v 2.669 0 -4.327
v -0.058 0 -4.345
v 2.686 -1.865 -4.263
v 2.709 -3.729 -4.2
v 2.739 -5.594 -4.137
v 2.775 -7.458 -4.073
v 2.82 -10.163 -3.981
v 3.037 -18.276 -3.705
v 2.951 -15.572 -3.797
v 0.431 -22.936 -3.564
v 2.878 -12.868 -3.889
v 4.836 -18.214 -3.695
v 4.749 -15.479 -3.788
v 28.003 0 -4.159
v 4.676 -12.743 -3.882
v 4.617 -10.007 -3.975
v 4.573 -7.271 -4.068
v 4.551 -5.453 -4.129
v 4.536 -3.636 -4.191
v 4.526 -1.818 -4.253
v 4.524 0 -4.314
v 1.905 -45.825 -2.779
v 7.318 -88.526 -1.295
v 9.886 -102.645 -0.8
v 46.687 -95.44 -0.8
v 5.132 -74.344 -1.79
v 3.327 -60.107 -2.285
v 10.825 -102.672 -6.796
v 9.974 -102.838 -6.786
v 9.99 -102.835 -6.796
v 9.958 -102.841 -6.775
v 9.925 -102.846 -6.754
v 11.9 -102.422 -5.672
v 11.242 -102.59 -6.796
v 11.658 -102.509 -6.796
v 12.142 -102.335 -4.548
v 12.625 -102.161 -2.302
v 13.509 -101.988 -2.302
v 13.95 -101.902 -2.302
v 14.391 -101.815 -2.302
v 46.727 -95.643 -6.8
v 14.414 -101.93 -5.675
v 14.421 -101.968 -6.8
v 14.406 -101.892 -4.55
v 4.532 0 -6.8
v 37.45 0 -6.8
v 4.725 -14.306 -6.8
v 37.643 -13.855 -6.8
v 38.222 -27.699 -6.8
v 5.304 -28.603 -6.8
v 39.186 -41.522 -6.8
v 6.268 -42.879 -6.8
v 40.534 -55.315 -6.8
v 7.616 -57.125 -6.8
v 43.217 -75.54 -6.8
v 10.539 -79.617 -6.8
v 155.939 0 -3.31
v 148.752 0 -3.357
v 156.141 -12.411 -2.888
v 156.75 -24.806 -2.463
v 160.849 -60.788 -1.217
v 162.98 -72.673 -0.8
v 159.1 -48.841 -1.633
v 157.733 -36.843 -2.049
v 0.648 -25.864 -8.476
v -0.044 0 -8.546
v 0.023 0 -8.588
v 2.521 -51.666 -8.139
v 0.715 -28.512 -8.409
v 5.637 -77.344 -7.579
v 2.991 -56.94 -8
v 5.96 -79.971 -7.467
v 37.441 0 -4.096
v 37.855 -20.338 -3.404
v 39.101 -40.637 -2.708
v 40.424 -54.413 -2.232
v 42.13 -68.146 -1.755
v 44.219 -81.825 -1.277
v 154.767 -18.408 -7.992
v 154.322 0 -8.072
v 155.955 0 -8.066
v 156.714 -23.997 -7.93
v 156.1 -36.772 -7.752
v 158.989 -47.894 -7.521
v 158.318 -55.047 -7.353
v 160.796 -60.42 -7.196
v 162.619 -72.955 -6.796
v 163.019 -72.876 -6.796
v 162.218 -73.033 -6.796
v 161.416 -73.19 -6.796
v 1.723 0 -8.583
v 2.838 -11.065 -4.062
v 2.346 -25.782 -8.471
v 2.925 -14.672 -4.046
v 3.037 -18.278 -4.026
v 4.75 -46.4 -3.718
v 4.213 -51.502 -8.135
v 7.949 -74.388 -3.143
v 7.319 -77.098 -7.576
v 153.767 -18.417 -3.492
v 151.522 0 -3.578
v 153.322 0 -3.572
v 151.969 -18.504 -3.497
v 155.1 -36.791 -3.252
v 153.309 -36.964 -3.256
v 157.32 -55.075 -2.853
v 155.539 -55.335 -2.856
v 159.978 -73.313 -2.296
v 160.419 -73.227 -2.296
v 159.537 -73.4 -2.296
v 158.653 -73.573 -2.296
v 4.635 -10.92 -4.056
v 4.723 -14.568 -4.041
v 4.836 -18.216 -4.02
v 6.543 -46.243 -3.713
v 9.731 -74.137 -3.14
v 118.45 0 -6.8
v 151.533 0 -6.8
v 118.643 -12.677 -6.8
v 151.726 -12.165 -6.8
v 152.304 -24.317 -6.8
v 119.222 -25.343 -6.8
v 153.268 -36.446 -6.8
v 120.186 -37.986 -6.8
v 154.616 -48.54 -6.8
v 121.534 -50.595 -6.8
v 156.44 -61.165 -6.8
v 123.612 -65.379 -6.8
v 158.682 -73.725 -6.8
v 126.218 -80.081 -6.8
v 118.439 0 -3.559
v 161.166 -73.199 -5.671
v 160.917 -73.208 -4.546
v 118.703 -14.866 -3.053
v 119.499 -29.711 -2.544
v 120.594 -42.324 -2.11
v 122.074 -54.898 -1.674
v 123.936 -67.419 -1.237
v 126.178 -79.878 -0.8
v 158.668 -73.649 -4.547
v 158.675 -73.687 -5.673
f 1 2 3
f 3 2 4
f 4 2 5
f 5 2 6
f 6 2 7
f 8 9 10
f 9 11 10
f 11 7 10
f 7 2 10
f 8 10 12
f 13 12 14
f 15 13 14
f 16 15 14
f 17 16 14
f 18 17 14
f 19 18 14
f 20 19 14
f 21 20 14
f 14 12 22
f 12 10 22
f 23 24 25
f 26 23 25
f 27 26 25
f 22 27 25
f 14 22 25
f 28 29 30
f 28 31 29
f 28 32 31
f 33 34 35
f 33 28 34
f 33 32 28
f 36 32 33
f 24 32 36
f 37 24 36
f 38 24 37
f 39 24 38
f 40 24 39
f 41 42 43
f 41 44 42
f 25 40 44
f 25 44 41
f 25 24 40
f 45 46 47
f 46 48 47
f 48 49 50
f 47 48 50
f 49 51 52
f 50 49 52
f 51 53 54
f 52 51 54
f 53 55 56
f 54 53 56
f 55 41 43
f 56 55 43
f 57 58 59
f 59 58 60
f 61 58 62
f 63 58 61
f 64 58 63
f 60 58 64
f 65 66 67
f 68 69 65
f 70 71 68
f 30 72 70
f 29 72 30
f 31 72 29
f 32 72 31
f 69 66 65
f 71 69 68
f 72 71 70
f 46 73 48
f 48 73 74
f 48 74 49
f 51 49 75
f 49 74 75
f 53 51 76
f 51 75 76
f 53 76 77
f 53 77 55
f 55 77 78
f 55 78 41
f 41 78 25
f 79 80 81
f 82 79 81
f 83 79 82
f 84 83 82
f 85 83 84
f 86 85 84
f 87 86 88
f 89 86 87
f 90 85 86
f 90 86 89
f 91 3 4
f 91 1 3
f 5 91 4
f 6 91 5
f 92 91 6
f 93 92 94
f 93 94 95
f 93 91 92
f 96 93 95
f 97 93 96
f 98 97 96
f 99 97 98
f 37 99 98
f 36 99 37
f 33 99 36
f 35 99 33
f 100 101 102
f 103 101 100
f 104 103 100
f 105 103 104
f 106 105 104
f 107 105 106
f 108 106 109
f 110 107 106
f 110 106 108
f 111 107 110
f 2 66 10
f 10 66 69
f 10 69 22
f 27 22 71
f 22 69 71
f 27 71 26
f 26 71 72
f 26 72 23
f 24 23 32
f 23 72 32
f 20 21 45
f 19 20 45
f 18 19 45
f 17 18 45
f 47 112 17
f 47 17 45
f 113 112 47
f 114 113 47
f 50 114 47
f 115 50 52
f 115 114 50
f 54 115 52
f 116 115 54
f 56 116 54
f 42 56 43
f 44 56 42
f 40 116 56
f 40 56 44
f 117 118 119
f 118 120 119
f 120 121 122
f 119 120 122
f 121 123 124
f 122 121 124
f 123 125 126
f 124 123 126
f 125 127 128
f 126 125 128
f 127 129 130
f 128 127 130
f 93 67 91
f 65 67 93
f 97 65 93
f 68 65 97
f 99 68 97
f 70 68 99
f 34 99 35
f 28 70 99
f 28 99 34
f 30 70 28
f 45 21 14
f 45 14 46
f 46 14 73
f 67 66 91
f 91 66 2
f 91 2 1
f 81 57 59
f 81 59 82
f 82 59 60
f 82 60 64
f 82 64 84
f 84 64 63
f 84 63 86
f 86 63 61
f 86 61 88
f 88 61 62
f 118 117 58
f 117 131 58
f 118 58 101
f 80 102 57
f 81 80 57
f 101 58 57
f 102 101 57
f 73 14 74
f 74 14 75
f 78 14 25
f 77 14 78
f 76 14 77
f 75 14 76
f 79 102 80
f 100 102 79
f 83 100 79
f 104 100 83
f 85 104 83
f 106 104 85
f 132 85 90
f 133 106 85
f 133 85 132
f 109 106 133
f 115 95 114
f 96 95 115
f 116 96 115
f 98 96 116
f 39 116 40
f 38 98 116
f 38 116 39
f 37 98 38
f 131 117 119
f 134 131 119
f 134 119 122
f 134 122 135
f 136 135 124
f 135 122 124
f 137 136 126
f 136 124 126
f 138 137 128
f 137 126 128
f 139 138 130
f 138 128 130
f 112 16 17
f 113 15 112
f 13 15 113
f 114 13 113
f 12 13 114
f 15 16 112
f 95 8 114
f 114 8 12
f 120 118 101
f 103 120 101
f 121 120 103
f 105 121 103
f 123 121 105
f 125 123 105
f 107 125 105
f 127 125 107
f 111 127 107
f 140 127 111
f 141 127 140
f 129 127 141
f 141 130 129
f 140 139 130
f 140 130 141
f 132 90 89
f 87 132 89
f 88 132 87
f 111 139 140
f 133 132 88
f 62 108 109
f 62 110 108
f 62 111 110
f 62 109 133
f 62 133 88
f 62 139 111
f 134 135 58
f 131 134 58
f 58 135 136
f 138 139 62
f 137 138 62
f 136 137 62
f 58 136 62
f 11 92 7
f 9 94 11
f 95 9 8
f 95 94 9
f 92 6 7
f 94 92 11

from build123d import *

# Parameters (mm, degrees)
F1_ANGLE_BACK = 11.25
F1_ANGLE      = 22.5
F2_W          = 148
F2_H          = 20.6737495929
F3_ANGLE      = 30
F5_DEPTH      = 236
F7_DEPTH      = 186.2
F8_W          = 237.9835397005
F8_H          = 111.4437803626
F9_DEPTH      = 169
F11_ANGLE     = 30
F13_ANGLE     = 2


with BuildPart() as f1:
    # F0 (on Front) → F1 (revolve)
    with BuildSketch(Plane.XZ, mode=Mode.PRIVATE) as f1_sk:
        Polygon((37.433034228, -1.662807624), (-0.066965772, -1.7883691504), (0, -21.7882570398), (37.5, -21.6626955134), align=None)
    revolve(f1_sk.sketch.rotate(Axis((525.8388087714, 0, 45.6422517605), (-0.1769446249, 0, 0.9842208084)), -F1_ANGLE_BACK), axis=Axis((525.8388087714, 0, 45.6422517605), (-0.1769446249, 0, 0.9842208084)), revolution_arc=F1_ANGLE)


with BuildPart() as f1b:
    # F0 (on Front) → F1, piece 2 (revolve)
    with BuildSketch(Plane.XZ, mode=Mode.PRIVATE) as f1_sk:
        Polygon((155.9321597647, -1.2660361285), (118.4321597647, -1.391597655), (118.4991255367, -21.3914855443), (155.9991255367, -21.2659240179), align=None)
    revolve(f1_sk.sketch.rotate(Axis((525.8388087714, 0, 45.6422517605), (-0.1769446249, 0, 0.9842208084)), -F1_ANGLE_BACK), axis=Axis((525.8388087714, 0, 45.6422517605), (-0.1769446249, 0, 0.9842208084)), revolution_arc=F1_ANGLE)


with BuildPart() as f3_tool:
    # F2 (on Front) → F3 (revolve)
    with BuildSketch(Plane.XZ):
        with Locations((78, -17.1368747965)):
            Rectangle(F2_W, F2_H)
    revolve(axis=Axis((526, 0, -14.0515491366), (0, 0, 1)), revolution_arc=F3_ANGLE)


with BuildPart() as f1_1:
    add(f1.part)

    # F3: cut by f3_tool
    add(f3_tool.part, mode=Mode.SUBTRACT)

    # F4 (on face) → F5 (cut)
    with BuildSketch(Plane(origin=(19.6894657776, -100.5725829361, 3.539800323), x_dir=(0.9813925868, 0.1918931334, -0.0067539617), z_dir=(0.1920119545, -0.9807852804, 0.0345201838))):
        Polygon((-21.0222958188, 9.4158053398), (-21.0222958188, -4.4840821492), (-9.9895421705, -4.4095212135), (-9.9949485621, -3.6095394819), (27.5044053117, -3.3561134558), (27.5098117032, -4.1560951874), (69.5515194148, -3.8719712809), (67.8833723068, 14.5498467609), align=None)
        Polygon((-9.9949485621, -3.6095394819), (-9.9895421705, -4.4095212135), (27.5098117032, -4.1560951874), (27.5044053117, -3.3561134558), align=None)
    extrude(amount=-F5_DEPTH, mode=Mode.SUBTRACT)


with BuildPart() as f1b_1:
    add(f1b.part)

    # F3: cut by f3_tool
    add(f3_tool.part, mode=Mode.SUBTRACT)

    # F6 (on face) → F7 (cut)
    with BuildSketch(Plane(origin=(19.6894657776, -100.5725829361, 3.539800323), x_dir=(0.9813925868, 0.1918931334, -0.0067539617), z_dir=(0.1920119545, -0.9807852804, 0.0345201838))):
        Polygon((100.3562242672, 19.0413011501), (98.4019598925, -3.6769958553), (108.5075416222, -3.6087008807), (108.5021352307, -2.8087191491), (146.0014891044, -2.555293123), (146.006895496, -3.3552748546), (187.190919741, -3.0769472963), (179.3207939647, 20.8833962762), align=None)
        Polygon((108.5021352307, -2.8087191491), (108.5075416222, -3.6087008807), (146.006895496, -3.3552748546), (146.0014891044, -2.555293123), align=None)
    extrude(amount=-F7_DEPTH, mode=Mode.SUBTRACT)


with BuildPart() as f9_tool:
    # F8 (on Front) → F9 (new body)
    with BuildSketch(Plane.XZ):
        with Locations((78.8098350167, -9.5459856093)):
            Rectangle(F8_W, F8_H)
    extrude(amount=-F9_DEPTH)


with BuildPart() as f1_2:
    add(f1_1.part)

    # F9: cut by f9_tool
    add(f9_tool.part, mode=Mode.SUBTRACT)


with BuildPart() as f1b_2:
    add(f1b_1.part)

    # F9: cut by f9_tool
    add(f9_tool.part, mode=Mode.SUBTRACT)


with BuildPart() as f11_tool:
    # F10 (on Front) → F11 (revolve)
    with BuildSketch(Plane.XZ):
        Polygon((1.7227589607, -8.5826770598), (0.0227684901, -8.5883691504), (0.066965772, -21.7882570398), (4.5820021559, -21.7731393102), (4.5227488708, -4.0766501403), (2.7227589607, -4.0826770598), align=None)
        Polygon((156.0660913087, -21.2659240179), (156.0218940268, -8.0660361285), (154.3219035562, -8.0717282192), (153.3219035562, -3.5717282192), (151.5219136462, -3.5777551387), (151.5811893534, -21.2809408481), align=None)
        Polygon((0.066965772, -21.7882570398), (0.0227684901, -8.5883691504), (-1.333771972, -7.7270860784), (-1.2827424282, -22.9674861319), align=None)
    revolve(axis=Axis((525.9057745435, 0, 45.6422517605), (-0.1769446249, 0, 0.9842208084)), revolution_arc=F11_ANGLE)


with BuildPart() as f1_3:
    add(f1_2.part)

    # F11: cut by f11_tool
    add(f11_tool.part, mode=Mode.SUBTRACT)

    # F12 (on Front) → F13 (revolve, cut)
    with BuildSketch(Plane.XZ):
        Polygon((2.7227589607, -2.8102906857), (2.7227589607, -4.0826770598), (4.5227488708, -4.0766501404), (4.5227488708, -2.8042637662), align=None)
    revolve(axis=Axis((525.9057745435, 0, 45.6422517605), (-0.1769446249, 0, 0.9842208084)), revolution_arc=F13_ANGLE, mode=Mode.SUBTRACT)


with BuildPart() as f1b_3:
    add(f1b_2.part)

    # F11: cut by f11_tool
    add(f11_tool.part, mode=Mode.SUBTRACT)


solid = Compound([f1_3.part, f1b_3.part])
